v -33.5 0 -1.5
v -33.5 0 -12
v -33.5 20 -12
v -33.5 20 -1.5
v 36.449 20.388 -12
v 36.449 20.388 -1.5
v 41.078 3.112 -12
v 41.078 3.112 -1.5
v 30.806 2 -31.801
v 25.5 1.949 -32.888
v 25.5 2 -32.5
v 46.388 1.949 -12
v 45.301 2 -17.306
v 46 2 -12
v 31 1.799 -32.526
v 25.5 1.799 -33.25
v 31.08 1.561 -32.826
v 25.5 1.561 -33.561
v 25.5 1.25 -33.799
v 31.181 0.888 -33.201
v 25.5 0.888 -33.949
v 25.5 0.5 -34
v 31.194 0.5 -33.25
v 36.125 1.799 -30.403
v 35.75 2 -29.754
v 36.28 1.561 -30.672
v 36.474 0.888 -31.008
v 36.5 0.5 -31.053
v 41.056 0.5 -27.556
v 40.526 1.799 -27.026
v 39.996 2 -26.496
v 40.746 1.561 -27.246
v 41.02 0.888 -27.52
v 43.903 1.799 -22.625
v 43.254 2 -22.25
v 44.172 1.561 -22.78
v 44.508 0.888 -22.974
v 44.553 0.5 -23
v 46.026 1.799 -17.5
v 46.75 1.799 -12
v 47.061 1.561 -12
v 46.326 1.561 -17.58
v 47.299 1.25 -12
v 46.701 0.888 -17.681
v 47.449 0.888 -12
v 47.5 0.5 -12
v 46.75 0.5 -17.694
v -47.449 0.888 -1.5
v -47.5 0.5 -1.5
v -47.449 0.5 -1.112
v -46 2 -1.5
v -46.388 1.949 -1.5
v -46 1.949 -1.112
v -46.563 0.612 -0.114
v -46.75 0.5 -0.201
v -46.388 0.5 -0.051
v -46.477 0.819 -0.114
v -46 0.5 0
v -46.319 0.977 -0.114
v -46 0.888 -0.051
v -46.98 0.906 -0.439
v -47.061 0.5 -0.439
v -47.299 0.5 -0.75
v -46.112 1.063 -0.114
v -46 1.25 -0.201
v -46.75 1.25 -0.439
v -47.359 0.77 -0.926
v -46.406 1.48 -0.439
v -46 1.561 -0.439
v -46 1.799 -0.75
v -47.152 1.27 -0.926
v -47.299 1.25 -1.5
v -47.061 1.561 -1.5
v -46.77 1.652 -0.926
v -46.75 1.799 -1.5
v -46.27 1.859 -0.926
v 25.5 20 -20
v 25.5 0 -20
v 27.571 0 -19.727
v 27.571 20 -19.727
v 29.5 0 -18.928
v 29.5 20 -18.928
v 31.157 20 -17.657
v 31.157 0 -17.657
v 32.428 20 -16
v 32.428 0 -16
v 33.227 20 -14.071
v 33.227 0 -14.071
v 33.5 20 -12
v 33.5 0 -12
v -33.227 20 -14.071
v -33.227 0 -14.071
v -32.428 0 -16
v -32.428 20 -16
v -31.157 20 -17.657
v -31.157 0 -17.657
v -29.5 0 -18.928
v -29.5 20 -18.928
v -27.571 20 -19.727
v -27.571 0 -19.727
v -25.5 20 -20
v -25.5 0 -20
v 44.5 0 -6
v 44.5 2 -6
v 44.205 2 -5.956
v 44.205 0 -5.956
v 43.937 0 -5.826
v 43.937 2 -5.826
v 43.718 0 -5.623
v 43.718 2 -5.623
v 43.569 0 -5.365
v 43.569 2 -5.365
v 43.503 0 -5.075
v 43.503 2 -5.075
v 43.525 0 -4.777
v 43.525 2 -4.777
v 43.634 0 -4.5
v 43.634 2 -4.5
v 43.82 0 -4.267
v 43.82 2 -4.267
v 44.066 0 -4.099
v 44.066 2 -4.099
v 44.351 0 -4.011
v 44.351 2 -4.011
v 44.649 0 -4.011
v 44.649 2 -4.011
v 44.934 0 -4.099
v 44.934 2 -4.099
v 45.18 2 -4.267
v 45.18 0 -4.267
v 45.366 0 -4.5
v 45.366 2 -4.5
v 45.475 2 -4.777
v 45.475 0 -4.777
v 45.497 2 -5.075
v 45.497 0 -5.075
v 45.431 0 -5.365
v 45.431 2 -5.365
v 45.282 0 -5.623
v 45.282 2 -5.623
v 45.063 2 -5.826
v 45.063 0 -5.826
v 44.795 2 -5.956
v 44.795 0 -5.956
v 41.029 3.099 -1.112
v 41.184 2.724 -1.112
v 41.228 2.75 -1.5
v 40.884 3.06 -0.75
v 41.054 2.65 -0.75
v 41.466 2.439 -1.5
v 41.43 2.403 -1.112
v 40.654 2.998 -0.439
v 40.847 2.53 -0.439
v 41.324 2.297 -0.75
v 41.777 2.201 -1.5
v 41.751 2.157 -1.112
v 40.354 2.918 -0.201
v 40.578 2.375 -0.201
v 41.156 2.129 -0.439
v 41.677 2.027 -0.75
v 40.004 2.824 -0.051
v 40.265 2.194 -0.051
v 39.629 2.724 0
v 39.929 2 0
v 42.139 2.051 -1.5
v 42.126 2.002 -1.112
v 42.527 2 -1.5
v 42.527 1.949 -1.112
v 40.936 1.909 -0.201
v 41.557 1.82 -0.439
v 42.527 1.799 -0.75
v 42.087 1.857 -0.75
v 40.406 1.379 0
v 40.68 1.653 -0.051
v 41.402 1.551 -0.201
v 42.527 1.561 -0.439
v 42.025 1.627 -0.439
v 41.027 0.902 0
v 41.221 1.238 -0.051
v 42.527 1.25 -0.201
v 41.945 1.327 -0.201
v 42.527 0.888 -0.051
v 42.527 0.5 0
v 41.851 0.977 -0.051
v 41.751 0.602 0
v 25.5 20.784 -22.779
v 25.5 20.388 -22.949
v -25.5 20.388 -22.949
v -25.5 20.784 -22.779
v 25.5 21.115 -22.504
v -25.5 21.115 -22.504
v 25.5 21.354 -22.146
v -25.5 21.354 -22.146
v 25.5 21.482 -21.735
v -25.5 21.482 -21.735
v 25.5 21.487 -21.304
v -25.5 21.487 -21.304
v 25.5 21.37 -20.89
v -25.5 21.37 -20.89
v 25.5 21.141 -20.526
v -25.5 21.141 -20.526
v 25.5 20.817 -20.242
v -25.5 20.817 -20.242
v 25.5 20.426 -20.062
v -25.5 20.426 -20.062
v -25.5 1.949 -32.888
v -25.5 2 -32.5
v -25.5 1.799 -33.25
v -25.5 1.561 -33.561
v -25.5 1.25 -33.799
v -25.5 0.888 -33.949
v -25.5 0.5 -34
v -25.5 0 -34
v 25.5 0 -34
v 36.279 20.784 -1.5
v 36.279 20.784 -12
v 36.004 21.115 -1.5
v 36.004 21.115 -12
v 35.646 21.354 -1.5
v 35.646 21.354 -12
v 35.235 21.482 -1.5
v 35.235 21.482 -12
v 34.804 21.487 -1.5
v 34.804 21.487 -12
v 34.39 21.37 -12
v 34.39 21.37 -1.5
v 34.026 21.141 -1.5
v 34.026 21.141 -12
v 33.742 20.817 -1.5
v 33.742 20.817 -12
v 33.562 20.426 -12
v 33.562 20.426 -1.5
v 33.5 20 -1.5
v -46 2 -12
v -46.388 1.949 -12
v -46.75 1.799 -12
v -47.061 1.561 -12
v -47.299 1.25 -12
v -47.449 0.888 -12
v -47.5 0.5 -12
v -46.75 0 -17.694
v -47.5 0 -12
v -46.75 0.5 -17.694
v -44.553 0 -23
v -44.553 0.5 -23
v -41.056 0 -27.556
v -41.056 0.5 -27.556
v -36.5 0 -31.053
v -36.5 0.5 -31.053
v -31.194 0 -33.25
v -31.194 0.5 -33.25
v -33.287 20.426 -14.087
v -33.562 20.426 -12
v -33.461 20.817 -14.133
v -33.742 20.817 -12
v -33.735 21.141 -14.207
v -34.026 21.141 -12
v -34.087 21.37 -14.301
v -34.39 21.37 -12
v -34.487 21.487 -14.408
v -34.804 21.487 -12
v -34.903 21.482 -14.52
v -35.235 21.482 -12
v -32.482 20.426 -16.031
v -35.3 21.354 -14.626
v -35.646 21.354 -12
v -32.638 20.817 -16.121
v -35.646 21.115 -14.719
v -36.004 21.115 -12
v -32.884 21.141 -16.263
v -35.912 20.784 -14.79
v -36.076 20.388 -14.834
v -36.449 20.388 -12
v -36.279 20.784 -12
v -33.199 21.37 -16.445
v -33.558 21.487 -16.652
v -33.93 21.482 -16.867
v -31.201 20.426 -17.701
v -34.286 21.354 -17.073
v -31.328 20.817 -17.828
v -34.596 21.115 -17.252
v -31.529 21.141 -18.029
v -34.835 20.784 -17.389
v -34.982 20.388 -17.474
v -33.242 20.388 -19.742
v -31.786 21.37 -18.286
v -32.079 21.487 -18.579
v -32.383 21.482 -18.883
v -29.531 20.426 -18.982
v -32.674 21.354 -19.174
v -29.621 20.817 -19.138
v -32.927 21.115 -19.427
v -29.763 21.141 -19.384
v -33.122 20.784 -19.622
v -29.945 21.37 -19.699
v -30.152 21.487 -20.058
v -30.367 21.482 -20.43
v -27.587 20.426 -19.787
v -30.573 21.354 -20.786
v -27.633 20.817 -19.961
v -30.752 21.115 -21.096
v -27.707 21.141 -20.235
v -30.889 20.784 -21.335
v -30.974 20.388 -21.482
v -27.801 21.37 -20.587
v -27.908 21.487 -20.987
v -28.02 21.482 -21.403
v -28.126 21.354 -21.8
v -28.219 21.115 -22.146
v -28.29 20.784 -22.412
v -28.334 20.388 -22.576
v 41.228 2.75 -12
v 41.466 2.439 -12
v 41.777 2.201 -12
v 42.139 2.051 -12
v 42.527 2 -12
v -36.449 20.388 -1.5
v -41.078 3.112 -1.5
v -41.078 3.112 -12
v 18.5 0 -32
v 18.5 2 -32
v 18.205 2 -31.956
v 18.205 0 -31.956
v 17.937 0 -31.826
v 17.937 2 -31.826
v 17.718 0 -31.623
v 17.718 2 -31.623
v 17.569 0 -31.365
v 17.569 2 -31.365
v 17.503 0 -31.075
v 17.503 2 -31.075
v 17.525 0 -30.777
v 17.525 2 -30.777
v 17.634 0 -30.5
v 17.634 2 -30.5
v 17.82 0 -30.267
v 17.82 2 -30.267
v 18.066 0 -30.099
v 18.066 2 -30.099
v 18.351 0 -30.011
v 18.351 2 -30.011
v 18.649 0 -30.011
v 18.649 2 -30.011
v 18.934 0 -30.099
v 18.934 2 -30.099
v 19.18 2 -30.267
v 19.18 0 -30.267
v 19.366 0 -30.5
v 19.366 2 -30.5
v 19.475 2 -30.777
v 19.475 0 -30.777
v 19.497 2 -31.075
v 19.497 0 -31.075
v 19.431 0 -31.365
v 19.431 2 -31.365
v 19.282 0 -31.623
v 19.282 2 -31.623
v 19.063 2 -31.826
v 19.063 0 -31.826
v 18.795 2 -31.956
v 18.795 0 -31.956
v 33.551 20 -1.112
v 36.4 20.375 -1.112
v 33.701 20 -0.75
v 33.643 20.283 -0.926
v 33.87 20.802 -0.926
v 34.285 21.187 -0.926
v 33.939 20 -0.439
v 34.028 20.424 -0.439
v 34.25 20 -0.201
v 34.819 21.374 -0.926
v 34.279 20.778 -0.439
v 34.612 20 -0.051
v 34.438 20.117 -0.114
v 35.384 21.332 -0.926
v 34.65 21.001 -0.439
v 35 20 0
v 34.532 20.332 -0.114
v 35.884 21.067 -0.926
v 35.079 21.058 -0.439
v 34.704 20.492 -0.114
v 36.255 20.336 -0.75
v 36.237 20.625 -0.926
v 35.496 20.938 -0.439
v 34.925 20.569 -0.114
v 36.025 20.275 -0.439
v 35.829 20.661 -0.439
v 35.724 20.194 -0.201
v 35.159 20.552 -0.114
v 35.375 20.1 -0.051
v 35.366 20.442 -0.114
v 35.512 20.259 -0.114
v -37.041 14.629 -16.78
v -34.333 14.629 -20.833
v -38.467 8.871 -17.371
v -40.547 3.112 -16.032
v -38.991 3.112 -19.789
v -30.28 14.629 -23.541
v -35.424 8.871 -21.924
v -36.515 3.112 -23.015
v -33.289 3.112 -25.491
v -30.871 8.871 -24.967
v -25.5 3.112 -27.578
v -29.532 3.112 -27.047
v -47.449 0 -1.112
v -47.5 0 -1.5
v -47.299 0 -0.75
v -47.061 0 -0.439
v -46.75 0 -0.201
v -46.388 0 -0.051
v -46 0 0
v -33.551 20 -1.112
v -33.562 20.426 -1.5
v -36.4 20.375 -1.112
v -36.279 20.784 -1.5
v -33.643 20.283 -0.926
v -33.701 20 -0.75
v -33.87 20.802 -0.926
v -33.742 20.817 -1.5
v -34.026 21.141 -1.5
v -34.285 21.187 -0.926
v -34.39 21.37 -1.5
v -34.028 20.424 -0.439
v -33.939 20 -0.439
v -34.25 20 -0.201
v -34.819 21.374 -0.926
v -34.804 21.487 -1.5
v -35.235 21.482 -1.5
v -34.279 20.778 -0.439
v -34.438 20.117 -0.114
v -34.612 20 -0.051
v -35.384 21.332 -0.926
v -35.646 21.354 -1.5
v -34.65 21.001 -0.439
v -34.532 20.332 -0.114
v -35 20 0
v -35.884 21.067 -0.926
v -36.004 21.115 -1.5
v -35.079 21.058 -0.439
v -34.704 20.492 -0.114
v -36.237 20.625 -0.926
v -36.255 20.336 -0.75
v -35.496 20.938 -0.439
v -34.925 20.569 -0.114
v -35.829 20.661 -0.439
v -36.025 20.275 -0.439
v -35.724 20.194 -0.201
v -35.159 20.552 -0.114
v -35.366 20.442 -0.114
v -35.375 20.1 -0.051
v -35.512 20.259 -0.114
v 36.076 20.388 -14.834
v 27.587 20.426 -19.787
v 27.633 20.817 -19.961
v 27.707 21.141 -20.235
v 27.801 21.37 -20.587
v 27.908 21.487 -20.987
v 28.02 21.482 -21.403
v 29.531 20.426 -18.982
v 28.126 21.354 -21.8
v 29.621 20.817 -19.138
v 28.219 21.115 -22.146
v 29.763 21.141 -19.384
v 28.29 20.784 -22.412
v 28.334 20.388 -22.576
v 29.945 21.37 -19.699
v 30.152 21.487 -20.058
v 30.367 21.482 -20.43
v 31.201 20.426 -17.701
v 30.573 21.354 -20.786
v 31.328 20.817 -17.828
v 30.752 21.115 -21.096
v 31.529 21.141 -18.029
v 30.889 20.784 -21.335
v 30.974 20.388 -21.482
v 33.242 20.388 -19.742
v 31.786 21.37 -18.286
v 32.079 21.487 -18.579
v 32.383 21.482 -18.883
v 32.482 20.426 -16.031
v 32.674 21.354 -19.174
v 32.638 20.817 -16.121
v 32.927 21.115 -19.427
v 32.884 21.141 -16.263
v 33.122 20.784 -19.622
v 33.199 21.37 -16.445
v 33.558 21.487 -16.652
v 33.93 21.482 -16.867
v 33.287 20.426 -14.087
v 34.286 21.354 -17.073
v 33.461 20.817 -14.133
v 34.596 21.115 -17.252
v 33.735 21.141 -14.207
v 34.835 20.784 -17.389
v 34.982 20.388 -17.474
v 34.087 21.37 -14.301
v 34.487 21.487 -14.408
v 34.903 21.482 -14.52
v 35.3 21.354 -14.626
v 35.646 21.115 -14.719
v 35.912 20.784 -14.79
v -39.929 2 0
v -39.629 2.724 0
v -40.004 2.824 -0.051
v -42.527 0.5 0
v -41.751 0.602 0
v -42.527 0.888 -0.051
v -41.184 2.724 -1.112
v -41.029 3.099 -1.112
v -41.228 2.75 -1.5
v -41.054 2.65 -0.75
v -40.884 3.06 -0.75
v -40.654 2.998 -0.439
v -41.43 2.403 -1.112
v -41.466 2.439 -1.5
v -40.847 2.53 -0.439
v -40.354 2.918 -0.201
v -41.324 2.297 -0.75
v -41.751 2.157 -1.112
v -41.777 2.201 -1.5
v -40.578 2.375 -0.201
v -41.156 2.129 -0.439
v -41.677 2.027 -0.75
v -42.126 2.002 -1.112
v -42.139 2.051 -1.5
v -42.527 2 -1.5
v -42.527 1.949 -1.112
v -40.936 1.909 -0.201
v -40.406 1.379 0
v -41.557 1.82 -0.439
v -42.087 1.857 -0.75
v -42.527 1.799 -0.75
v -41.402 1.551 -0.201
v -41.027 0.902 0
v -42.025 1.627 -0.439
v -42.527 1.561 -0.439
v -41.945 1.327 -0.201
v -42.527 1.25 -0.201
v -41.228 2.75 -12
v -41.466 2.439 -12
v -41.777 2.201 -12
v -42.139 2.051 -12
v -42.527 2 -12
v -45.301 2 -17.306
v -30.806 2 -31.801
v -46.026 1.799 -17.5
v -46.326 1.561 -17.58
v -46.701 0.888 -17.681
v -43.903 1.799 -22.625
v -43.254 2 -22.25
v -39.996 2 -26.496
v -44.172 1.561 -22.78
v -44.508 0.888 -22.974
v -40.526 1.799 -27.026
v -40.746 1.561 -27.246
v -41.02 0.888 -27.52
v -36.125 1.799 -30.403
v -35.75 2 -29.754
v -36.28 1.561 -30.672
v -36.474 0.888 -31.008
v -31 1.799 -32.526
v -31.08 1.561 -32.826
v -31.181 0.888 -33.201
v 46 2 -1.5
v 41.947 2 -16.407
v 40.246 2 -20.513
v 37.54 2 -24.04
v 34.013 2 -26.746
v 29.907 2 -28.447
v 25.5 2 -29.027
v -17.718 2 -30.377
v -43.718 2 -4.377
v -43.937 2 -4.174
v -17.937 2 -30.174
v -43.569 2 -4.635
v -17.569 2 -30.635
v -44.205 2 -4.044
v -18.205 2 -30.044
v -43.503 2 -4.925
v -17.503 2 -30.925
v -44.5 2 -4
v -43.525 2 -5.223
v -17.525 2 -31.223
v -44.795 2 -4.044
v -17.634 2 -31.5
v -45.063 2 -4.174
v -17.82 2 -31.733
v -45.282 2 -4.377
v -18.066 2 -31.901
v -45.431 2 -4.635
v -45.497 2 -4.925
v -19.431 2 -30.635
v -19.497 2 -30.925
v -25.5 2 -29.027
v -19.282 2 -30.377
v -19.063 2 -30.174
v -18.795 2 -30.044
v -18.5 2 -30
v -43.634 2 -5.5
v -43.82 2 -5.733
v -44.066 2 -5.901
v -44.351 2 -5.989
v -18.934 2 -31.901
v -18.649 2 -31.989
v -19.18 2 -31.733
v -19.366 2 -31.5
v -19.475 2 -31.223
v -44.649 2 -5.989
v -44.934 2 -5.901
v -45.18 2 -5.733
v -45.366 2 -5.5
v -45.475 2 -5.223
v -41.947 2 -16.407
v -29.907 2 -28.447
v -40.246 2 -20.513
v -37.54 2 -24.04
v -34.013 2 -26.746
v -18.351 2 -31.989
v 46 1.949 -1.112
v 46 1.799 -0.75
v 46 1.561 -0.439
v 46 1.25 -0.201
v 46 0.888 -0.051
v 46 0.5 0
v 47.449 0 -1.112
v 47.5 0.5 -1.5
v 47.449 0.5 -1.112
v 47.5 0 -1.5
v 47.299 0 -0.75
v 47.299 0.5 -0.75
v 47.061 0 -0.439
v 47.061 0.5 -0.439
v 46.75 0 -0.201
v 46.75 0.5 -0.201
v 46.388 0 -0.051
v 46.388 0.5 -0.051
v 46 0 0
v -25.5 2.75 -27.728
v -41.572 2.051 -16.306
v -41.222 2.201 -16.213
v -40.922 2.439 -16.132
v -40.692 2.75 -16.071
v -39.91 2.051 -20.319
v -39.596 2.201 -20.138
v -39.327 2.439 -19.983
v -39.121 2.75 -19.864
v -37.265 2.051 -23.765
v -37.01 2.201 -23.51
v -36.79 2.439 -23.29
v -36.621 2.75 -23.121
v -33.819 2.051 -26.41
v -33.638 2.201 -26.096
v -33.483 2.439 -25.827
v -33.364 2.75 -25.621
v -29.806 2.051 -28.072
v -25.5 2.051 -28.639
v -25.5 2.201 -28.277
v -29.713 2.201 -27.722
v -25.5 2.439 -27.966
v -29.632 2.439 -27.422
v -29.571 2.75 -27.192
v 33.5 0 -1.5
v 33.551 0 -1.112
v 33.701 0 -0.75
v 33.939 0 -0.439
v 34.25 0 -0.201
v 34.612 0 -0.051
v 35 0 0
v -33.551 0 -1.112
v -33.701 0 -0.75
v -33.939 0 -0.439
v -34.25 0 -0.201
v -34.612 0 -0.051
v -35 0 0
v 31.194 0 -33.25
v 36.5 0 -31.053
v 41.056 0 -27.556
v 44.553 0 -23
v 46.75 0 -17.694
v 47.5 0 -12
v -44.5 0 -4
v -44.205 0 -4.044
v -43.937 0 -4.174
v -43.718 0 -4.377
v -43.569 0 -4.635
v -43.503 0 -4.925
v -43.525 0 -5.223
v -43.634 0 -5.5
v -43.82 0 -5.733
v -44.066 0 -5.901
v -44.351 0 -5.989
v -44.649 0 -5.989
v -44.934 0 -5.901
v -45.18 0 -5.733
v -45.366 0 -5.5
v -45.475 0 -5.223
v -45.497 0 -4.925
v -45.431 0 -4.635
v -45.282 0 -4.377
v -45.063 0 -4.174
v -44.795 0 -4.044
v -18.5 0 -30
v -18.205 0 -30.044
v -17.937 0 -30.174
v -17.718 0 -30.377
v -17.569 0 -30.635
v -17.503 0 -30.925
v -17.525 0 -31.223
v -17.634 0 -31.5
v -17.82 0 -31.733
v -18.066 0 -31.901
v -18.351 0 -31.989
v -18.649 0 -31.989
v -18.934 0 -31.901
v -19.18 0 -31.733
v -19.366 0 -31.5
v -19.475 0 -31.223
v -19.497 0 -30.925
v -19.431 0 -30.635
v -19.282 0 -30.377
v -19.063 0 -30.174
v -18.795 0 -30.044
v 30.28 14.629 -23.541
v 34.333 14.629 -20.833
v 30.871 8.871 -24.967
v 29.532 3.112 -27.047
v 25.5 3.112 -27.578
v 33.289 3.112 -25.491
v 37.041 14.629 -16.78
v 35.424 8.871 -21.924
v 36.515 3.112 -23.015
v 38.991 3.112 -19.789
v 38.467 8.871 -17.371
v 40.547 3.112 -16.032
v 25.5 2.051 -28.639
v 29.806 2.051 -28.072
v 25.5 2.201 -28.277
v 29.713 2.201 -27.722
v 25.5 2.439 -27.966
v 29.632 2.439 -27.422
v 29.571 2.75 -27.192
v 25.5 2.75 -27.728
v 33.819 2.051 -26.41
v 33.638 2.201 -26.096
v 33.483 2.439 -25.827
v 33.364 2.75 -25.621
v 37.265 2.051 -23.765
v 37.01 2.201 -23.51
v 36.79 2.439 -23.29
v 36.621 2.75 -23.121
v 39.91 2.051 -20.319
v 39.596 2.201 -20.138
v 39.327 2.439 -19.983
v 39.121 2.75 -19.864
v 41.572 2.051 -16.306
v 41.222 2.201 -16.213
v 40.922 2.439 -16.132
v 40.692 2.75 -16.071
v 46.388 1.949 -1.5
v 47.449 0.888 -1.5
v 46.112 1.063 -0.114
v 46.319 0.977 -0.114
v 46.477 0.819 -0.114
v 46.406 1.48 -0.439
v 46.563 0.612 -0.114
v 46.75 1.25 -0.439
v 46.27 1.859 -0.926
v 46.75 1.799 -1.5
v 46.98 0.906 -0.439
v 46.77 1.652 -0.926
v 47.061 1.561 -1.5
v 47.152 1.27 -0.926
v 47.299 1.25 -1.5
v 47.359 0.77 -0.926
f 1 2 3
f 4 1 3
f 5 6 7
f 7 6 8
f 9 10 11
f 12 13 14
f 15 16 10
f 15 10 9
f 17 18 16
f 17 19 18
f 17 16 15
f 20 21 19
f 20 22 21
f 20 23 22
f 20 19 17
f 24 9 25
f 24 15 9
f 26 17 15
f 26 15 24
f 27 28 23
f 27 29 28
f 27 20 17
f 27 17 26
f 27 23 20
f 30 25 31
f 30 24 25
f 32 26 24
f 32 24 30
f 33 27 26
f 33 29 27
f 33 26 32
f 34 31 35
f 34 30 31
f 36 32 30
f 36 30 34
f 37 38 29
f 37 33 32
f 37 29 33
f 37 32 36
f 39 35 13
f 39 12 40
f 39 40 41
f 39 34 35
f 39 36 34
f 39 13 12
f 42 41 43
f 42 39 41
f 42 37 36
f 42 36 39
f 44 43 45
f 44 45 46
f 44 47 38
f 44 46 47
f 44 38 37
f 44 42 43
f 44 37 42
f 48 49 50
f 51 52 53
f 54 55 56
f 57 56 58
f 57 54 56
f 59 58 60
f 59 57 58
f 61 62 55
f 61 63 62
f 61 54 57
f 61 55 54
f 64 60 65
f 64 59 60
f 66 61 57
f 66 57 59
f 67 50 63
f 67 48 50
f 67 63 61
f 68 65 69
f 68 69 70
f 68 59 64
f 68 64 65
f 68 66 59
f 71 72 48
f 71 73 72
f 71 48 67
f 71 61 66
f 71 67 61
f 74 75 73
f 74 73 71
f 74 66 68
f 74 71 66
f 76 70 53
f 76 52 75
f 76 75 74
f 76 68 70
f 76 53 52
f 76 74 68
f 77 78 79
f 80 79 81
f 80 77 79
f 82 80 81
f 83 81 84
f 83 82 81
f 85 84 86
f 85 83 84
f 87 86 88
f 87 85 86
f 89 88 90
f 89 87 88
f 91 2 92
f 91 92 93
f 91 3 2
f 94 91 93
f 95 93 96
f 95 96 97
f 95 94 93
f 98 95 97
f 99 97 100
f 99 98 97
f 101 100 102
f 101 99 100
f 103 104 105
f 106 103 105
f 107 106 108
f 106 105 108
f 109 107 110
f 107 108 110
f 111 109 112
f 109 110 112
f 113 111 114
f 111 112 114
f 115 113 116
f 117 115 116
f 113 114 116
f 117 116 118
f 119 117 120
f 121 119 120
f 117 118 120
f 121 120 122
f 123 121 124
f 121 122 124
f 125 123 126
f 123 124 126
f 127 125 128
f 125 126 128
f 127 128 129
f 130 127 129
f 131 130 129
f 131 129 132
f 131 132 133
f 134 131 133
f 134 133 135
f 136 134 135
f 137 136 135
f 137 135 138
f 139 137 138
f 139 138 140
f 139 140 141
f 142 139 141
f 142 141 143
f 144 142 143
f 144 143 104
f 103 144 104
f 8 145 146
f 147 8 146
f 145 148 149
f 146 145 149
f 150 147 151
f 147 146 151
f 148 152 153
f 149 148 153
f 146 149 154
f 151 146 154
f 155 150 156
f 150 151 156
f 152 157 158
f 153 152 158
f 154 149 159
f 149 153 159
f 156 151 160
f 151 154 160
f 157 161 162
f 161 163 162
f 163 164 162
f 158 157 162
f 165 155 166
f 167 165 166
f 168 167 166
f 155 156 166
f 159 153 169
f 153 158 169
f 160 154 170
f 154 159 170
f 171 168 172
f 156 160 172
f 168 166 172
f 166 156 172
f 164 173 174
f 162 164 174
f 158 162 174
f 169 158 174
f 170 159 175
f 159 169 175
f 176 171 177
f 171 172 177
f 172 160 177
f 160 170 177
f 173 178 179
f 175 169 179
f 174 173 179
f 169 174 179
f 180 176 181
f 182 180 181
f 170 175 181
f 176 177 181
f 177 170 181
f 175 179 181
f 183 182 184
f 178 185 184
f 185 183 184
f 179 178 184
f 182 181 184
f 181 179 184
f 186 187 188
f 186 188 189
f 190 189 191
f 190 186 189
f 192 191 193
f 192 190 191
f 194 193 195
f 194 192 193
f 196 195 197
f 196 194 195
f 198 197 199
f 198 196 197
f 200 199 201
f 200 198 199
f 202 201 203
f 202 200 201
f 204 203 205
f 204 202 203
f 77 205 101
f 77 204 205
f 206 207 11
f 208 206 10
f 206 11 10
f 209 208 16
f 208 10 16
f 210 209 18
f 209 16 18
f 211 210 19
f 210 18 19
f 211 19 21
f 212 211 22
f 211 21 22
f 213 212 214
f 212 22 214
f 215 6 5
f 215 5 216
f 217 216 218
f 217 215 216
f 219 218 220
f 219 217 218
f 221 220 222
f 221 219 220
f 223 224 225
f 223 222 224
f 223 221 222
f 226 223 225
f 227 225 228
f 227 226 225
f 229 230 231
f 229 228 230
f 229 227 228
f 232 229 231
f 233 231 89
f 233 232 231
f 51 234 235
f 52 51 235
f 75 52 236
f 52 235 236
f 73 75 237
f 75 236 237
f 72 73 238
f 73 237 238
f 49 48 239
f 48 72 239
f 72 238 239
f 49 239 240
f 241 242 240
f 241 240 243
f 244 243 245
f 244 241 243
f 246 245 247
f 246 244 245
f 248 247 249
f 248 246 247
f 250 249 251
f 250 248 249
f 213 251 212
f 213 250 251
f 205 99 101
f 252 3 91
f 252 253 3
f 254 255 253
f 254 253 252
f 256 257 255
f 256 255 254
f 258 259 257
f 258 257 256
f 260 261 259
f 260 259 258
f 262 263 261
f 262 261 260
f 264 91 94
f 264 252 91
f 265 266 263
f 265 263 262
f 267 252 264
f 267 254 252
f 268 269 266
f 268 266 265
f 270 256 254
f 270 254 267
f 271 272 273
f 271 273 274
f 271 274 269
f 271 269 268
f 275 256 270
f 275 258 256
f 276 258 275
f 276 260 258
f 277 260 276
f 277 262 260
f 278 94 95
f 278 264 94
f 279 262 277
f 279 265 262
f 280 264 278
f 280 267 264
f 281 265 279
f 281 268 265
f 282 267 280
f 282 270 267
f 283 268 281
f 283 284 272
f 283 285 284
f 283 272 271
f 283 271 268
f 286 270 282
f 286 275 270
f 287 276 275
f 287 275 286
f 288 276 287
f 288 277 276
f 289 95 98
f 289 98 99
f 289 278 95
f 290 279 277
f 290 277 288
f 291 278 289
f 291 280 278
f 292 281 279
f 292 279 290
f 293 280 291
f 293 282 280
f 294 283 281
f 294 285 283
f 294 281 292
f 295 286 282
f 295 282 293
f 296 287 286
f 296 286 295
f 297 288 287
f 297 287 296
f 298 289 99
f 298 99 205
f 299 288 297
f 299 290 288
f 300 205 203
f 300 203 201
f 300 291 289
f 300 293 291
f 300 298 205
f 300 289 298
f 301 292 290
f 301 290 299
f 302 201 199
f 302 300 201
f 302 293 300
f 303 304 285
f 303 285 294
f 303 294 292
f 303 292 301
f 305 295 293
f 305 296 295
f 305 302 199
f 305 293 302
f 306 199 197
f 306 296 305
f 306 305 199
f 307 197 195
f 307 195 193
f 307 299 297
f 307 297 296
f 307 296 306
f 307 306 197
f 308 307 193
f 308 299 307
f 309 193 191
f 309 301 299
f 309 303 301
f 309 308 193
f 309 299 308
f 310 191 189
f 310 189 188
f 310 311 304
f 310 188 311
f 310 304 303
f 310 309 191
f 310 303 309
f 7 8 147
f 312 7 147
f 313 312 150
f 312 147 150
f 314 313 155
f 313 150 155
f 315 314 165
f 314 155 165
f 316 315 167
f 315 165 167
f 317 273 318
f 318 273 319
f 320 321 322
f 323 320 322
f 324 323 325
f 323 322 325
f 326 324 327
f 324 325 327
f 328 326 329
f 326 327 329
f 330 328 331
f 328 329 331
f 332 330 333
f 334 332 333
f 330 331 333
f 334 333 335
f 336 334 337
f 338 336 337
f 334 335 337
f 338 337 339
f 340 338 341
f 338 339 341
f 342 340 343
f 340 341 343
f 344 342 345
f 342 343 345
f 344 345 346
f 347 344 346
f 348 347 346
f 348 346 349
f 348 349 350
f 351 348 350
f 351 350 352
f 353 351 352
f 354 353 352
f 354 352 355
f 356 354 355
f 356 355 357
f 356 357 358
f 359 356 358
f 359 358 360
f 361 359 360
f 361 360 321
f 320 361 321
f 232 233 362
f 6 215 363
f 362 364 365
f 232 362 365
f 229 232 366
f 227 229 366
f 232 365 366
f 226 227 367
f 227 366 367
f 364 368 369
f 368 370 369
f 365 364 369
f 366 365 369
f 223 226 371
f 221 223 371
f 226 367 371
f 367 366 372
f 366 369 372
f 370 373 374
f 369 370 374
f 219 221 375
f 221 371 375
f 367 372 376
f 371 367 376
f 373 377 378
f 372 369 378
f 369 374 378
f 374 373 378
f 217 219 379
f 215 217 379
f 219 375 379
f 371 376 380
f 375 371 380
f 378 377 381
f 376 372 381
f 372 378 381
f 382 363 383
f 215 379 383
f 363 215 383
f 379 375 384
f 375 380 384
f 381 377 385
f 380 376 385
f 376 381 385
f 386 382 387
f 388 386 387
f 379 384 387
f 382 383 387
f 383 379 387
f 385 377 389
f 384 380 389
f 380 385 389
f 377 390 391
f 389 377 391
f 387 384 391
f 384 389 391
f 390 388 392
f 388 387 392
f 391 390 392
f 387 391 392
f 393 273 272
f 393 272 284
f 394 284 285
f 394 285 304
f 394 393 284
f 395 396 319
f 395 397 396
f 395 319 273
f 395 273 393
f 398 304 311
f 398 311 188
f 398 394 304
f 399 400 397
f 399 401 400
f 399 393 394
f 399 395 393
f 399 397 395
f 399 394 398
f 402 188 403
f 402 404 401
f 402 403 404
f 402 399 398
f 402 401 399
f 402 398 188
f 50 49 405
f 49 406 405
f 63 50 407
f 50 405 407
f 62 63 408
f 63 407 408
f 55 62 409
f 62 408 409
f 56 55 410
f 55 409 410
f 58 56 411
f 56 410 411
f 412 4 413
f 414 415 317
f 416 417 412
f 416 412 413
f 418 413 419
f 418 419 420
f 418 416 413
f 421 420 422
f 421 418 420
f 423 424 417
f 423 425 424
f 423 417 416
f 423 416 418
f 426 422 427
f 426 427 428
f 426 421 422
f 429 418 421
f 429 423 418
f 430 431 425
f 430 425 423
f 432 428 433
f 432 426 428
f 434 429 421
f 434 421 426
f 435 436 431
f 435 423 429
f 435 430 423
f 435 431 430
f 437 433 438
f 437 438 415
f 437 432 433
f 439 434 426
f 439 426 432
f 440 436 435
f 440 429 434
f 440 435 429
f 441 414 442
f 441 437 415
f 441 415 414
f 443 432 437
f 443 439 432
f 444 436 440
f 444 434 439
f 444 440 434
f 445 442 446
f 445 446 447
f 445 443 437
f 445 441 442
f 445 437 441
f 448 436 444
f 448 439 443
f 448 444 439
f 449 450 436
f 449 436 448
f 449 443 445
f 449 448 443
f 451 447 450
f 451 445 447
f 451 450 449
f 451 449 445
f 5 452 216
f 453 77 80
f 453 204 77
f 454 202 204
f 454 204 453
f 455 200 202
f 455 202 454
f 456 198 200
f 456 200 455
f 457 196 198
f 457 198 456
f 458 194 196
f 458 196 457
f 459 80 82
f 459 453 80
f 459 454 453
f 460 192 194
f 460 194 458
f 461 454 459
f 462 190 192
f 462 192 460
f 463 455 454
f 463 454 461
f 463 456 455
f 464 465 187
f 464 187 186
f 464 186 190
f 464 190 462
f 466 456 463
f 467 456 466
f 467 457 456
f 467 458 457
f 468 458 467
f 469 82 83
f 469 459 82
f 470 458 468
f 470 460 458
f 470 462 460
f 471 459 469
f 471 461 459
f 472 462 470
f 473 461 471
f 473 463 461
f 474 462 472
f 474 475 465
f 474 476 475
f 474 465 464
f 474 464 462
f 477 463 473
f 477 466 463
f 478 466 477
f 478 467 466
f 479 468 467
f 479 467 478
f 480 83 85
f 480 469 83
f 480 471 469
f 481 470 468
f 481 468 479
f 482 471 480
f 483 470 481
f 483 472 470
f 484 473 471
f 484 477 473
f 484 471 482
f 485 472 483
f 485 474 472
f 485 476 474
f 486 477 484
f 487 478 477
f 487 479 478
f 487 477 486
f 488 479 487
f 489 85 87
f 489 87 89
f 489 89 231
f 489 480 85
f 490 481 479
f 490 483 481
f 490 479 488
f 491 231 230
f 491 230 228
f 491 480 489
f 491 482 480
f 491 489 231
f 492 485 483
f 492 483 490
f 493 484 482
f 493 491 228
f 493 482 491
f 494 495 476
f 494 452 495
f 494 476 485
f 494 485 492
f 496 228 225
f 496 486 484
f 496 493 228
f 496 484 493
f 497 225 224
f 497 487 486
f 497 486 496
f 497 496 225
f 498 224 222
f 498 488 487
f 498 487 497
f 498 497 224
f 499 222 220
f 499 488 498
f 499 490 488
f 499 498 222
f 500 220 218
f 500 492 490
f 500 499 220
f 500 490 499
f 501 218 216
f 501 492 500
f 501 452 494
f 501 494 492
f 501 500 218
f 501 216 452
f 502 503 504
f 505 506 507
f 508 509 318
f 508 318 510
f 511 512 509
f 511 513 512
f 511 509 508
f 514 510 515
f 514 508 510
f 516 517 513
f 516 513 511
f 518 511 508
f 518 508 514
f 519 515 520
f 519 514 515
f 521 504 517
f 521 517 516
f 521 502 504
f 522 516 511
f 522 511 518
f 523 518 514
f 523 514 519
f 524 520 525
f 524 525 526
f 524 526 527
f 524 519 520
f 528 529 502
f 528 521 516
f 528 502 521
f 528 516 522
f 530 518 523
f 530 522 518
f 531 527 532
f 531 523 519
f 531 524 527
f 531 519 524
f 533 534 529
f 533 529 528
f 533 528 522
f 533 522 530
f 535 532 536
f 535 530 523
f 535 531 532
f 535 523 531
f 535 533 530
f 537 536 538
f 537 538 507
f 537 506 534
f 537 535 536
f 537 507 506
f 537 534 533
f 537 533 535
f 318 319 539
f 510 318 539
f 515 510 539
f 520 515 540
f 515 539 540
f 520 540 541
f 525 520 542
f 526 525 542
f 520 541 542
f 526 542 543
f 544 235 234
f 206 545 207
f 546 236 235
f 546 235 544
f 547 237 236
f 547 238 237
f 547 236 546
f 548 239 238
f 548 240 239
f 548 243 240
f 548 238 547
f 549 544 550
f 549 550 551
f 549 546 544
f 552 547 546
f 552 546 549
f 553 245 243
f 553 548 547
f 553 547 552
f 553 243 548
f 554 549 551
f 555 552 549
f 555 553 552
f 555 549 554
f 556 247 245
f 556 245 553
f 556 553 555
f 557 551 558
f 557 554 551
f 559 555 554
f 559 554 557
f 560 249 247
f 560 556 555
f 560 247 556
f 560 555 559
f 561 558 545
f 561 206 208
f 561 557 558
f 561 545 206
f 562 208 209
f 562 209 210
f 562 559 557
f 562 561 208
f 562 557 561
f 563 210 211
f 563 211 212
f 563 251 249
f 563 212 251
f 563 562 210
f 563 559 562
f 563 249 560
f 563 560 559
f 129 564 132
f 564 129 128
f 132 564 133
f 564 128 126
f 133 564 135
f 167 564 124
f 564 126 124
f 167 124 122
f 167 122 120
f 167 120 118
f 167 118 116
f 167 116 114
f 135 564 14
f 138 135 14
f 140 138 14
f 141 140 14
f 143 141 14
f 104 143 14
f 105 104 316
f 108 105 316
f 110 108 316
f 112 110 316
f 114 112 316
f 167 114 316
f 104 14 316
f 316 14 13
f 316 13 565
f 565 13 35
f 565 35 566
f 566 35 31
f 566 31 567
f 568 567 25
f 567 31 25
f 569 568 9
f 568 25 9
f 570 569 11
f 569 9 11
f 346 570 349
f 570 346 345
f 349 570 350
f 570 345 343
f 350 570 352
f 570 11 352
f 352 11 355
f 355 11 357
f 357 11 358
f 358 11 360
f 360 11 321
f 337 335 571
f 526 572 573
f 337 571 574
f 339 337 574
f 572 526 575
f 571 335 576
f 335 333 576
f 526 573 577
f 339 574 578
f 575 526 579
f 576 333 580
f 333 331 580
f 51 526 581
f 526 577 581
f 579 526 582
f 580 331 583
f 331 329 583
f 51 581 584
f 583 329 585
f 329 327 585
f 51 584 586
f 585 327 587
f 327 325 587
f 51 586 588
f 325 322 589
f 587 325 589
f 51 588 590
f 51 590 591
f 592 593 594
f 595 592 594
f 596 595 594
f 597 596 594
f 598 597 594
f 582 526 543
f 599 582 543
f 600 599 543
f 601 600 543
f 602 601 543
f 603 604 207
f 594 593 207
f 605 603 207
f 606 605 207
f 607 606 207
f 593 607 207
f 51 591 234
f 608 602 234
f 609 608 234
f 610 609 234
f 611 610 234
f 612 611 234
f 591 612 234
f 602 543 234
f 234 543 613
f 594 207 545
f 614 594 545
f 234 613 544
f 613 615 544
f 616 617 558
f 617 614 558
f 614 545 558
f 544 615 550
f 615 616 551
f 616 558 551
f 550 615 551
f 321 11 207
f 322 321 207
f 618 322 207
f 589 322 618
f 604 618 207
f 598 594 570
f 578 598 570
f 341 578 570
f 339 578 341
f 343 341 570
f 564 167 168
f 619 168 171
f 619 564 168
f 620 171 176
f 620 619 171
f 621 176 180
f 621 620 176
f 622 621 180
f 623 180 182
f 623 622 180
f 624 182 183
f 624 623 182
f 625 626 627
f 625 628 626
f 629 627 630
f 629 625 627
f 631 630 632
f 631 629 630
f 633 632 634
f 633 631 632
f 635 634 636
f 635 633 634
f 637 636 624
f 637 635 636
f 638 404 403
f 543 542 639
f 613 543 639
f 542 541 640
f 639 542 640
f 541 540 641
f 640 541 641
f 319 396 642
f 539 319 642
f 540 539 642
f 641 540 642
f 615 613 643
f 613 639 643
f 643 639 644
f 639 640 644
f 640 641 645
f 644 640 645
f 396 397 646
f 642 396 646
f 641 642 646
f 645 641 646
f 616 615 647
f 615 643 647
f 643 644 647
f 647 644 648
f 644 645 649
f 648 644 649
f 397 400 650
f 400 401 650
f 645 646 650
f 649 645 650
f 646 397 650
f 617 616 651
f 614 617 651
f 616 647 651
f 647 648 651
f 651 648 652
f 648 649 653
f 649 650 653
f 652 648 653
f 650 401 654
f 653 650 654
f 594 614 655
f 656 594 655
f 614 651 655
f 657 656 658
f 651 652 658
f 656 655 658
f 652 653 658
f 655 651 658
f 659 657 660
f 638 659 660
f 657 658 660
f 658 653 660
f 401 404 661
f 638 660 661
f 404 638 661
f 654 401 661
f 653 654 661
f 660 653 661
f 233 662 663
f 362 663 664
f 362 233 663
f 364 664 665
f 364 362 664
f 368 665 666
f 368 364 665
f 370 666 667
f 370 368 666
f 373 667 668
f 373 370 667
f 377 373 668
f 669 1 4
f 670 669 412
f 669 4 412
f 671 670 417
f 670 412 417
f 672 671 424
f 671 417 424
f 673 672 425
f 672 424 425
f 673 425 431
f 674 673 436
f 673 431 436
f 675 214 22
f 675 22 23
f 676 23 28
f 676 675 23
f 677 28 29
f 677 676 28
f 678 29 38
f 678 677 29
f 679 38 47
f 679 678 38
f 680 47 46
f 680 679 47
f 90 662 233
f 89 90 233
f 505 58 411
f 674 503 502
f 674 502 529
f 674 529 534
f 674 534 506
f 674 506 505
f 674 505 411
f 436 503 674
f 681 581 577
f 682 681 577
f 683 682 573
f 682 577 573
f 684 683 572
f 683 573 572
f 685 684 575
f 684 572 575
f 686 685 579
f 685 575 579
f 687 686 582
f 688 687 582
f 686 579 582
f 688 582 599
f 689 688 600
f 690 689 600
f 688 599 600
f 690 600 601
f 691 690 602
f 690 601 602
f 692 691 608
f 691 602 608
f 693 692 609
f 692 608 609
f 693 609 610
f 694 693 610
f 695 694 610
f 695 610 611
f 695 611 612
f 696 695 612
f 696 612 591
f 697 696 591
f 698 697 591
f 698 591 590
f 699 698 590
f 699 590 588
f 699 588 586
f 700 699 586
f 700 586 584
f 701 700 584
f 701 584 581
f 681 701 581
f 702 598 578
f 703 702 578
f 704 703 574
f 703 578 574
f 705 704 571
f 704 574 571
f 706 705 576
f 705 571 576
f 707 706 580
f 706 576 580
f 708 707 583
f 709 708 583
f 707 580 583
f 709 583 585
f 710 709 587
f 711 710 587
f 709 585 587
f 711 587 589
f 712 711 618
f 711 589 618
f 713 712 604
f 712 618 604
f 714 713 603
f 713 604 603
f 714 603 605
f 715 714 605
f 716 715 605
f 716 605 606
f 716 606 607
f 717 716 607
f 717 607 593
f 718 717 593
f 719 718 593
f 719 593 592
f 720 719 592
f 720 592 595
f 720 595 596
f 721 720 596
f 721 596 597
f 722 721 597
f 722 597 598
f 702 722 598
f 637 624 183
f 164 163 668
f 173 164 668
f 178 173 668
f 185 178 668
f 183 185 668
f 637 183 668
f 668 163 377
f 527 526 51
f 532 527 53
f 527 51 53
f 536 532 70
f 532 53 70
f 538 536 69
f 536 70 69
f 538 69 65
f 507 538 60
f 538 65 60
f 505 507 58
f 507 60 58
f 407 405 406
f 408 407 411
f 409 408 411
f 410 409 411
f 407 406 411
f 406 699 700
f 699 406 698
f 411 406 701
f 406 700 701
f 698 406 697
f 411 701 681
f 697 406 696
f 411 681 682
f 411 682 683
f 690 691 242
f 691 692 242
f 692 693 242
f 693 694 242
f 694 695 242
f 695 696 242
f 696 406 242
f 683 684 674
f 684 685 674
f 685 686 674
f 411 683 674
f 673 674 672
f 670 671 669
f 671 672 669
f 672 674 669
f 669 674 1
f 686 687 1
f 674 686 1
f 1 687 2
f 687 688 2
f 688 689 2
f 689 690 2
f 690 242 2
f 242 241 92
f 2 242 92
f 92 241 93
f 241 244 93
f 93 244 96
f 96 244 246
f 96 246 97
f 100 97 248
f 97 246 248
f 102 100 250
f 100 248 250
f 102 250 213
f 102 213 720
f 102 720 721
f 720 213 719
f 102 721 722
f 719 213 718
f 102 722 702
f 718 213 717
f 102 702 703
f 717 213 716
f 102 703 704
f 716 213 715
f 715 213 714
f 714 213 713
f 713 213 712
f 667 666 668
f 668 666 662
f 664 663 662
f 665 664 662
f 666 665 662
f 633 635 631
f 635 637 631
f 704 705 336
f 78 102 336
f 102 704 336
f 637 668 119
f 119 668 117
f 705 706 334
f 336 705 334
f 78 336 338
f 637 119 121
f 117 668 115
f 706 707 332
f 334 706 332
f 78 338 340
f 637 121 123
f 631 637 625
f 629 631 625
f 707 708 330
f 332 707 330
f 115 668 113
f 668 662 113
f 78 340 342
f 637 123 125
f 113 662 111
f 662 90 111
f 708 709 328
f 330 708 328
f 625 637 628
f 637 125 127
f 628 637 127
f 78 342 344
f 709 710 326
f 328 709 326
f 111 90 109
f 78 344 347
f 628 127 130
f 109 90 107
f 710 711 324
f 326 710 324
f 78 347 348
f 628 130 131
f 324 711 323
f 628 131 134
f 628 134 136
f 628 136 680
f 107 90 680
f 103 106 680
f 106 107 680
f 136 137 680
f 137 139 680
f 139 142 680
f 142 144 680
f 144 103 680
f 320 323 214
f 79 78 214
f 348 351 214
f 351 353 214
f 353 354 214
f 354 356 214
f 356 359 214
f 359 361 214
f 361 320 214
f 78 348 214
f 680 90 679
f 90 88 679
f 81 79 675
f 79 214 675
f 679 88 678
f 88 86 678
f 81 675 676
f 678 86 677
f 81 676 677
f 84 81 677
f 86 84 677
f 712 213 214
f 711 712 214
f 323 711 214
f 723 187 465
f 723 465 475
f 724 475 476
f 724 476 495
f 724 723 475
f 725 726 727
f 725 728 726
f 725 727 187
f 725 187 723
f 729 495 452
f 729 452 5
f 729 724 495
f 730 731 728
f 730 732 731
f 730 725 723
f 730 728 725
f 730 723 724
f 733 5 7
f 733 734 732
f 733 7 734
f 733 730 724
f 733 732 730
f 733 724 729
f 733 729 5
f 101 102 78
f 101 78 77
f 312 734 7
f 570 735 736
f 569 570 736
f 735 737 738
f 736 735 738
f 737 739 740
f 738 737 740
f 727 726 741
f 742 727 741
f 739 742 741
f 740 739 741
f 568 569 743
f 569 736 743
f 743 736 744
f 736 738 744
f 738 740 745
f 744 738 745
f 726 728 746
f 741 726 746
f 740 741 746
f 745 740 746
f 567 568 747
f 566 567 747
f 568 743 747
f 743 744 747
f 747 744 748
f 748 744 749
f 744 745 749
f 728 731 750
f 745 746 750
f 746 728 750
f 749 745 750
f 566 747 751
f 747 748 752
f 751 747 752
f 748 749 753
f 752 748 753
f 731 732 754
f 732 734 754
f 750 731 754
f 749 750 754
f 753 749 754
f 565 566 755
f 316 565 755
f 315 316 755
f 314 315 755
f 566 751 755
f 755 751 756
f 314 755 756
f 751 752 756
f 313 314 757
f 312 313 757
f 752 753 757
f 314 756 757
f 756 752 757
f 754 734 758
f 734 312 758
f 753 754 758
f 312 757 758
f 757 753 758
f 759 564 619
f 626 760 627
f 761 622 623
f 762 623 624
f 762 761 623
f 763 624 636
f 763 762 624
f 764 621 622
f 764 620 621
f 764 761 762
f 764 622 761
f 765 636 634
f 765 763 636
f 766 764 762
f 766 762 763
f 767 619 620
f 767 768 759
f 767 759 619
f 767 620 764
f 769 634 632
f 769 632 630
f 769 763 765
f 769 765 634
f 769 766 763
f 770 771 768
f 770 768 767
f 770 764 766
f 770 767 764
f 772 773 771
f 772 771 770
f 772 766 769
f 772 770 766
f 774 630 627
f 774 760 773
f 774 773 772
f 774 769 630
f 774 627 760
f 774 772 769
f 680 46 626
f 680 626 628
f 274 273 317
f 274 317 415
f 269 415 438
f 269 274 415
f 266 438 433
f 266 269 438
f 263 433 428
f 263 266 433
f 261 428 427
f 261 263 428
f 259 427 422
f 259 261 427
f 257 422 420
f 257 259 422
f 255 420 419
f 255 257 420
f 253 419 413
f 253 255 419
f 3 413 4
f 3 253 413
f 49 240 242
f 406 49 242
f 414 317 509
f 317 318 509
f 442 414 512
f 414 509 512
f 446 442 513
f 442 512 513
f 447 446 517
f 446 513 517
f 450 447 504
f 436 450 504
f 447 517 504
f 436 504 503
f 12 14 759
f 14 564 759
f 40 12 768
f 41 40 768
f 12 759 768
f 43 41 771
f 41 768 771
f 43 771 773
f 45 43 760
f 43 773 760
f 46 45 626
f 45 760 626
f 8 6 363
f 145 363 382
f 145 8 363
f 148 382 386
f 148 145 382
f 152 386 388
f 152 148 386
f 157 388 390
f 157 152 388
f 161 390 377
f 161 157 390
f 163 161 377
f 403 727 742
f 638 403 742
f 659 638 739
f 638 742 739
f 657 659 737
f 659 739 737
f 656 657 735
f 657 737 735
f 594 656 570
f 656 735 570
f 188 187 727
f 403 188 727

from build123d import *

# Parameters (mm, degrees)
CONG_1_R                = 1.5
ESQUISSE3_R             = 0.9999999999999981
ESQUISSE3_R_2           = 1.0000000000000007
ENL_V_MAT_EXTRU_1_DEPTH = 62.583276982473095


with BuildPart() as part:
    # Balayage1: sweep along a path in Esquisse1
    with BuildLine(Plane(origin=(0, 0, 0), x_dir=(1, 0, 0), z_dir=(0, 1, 0))) as balayage1_path:
        Line((-33.5, 0), (-33.5, 11.999999999999943))
        ThreePointArc((-33.5, 11.999999999999943), (-31.156854249492383, 17.656854249492376), (-25.499999999999947, 20))
        Line((-25.499999999999947, 20), (25.499999999999947, 20))
        ThreePointArc((25.499999999999947, 20), (31.156854249492383, 17.65685424949238), (33.5, 11.999999999999943))
        Line((33.5, 11.999999999999943), (33.5, 0))
    # Esquisse2 → Balayage1 (sweep)
    with BuildSketch(Plane.XY):
        with BuildLine():
            Line((-33.5, 0), (-33.5, 20))
            ThreePointArc((-33.5, 20), (-34.804210711669924, 21.487167292060715), (-36.448888739433606, 20.388228567653773))
            Line((-36.448888739433606, 20.388228567653773), (-41.07810147691004, 3.111771432346228))
            ThreePointArc((-41.07810147691004, 3.111771432346228), (-41.613848072830564, 2.3099699895631494), (-42.52699021634365, 2))
            Line((-42.52699021634365, 2), (-47.5, 2))
            Line((-47.5, 2), (-47.5, 0))
            Line((-47.5, 0), (-33.5, 0))
        make_face()
    sweep(path=balayage1_path.line)

    # Congé1
    cong_1_edges = [part.edges().sort_by_distance(p)[0] for p in [
        (-47.5, 2, -5.999999999999972),
        (-41.056349186103986, 2, -27.556349186104107),
        (1.8119e-13, 2, -33.999999999999666),
        (41.05634918610424, 2, -27.556349186103848),
        (33.5, 10, 0),
        (34.80421071166993, 21.487167292060715, 4.086e-14),
        (38.7634951081718, 11.750000000000082, 1.4287e-13),
        (41.613848072830564, 2.3099699895631502, 2.4514e-13),
        (45.0134951081715, 2, 3.1274e-13),
        (47.5, 1, 3.8014e-13),
        (47.49999999999984, 2, -5.999999999999591),
        (-47.5, 1, 0),
        (-45.013495108171824, 2, 0),
        (-41.613848072830564, 2.3099699895631502, 0),
        (-38.763495108171824, 11.75, 0),
        (-34.80421071166993, 21.487167292060715, 0),
        (-33.5, 10, 0),
    ]]
    fillet(cong_1_edges, radius=CONG_1_R)

    # Esquisse3 → Enlèv. mat.-Extru.1 (cut, through all)
    with BuildSketch(Plane(origin=(0, 2, 0), x_dir=(1, 0, 0), z_dir=(0, 1, 0))):
        with Locations(Location((-44.5, 5, 0), (0, 0, 270))):
            Circle(ESQUISSE3_R)
        with Locations(Location((-18.5, 31.000000000000004, 0), (0, 0, 270))):
            Circle(ESQUISSE3_R_2)
        with Locations(Location((44.5, 5, 0), (0, 0, 90))):
            Circle(ESQUISSE3_R)
        with Locations(Location((18.5, 31.000000000000004, 0), (0, 0, 90))):
            Circle(ESQUISSE3_R_2)
    extrude(amount=-ENL_V_MAT_EXTRU_1_DEPTH, mode=Mode.SUBTRACT)


solid = part.part
